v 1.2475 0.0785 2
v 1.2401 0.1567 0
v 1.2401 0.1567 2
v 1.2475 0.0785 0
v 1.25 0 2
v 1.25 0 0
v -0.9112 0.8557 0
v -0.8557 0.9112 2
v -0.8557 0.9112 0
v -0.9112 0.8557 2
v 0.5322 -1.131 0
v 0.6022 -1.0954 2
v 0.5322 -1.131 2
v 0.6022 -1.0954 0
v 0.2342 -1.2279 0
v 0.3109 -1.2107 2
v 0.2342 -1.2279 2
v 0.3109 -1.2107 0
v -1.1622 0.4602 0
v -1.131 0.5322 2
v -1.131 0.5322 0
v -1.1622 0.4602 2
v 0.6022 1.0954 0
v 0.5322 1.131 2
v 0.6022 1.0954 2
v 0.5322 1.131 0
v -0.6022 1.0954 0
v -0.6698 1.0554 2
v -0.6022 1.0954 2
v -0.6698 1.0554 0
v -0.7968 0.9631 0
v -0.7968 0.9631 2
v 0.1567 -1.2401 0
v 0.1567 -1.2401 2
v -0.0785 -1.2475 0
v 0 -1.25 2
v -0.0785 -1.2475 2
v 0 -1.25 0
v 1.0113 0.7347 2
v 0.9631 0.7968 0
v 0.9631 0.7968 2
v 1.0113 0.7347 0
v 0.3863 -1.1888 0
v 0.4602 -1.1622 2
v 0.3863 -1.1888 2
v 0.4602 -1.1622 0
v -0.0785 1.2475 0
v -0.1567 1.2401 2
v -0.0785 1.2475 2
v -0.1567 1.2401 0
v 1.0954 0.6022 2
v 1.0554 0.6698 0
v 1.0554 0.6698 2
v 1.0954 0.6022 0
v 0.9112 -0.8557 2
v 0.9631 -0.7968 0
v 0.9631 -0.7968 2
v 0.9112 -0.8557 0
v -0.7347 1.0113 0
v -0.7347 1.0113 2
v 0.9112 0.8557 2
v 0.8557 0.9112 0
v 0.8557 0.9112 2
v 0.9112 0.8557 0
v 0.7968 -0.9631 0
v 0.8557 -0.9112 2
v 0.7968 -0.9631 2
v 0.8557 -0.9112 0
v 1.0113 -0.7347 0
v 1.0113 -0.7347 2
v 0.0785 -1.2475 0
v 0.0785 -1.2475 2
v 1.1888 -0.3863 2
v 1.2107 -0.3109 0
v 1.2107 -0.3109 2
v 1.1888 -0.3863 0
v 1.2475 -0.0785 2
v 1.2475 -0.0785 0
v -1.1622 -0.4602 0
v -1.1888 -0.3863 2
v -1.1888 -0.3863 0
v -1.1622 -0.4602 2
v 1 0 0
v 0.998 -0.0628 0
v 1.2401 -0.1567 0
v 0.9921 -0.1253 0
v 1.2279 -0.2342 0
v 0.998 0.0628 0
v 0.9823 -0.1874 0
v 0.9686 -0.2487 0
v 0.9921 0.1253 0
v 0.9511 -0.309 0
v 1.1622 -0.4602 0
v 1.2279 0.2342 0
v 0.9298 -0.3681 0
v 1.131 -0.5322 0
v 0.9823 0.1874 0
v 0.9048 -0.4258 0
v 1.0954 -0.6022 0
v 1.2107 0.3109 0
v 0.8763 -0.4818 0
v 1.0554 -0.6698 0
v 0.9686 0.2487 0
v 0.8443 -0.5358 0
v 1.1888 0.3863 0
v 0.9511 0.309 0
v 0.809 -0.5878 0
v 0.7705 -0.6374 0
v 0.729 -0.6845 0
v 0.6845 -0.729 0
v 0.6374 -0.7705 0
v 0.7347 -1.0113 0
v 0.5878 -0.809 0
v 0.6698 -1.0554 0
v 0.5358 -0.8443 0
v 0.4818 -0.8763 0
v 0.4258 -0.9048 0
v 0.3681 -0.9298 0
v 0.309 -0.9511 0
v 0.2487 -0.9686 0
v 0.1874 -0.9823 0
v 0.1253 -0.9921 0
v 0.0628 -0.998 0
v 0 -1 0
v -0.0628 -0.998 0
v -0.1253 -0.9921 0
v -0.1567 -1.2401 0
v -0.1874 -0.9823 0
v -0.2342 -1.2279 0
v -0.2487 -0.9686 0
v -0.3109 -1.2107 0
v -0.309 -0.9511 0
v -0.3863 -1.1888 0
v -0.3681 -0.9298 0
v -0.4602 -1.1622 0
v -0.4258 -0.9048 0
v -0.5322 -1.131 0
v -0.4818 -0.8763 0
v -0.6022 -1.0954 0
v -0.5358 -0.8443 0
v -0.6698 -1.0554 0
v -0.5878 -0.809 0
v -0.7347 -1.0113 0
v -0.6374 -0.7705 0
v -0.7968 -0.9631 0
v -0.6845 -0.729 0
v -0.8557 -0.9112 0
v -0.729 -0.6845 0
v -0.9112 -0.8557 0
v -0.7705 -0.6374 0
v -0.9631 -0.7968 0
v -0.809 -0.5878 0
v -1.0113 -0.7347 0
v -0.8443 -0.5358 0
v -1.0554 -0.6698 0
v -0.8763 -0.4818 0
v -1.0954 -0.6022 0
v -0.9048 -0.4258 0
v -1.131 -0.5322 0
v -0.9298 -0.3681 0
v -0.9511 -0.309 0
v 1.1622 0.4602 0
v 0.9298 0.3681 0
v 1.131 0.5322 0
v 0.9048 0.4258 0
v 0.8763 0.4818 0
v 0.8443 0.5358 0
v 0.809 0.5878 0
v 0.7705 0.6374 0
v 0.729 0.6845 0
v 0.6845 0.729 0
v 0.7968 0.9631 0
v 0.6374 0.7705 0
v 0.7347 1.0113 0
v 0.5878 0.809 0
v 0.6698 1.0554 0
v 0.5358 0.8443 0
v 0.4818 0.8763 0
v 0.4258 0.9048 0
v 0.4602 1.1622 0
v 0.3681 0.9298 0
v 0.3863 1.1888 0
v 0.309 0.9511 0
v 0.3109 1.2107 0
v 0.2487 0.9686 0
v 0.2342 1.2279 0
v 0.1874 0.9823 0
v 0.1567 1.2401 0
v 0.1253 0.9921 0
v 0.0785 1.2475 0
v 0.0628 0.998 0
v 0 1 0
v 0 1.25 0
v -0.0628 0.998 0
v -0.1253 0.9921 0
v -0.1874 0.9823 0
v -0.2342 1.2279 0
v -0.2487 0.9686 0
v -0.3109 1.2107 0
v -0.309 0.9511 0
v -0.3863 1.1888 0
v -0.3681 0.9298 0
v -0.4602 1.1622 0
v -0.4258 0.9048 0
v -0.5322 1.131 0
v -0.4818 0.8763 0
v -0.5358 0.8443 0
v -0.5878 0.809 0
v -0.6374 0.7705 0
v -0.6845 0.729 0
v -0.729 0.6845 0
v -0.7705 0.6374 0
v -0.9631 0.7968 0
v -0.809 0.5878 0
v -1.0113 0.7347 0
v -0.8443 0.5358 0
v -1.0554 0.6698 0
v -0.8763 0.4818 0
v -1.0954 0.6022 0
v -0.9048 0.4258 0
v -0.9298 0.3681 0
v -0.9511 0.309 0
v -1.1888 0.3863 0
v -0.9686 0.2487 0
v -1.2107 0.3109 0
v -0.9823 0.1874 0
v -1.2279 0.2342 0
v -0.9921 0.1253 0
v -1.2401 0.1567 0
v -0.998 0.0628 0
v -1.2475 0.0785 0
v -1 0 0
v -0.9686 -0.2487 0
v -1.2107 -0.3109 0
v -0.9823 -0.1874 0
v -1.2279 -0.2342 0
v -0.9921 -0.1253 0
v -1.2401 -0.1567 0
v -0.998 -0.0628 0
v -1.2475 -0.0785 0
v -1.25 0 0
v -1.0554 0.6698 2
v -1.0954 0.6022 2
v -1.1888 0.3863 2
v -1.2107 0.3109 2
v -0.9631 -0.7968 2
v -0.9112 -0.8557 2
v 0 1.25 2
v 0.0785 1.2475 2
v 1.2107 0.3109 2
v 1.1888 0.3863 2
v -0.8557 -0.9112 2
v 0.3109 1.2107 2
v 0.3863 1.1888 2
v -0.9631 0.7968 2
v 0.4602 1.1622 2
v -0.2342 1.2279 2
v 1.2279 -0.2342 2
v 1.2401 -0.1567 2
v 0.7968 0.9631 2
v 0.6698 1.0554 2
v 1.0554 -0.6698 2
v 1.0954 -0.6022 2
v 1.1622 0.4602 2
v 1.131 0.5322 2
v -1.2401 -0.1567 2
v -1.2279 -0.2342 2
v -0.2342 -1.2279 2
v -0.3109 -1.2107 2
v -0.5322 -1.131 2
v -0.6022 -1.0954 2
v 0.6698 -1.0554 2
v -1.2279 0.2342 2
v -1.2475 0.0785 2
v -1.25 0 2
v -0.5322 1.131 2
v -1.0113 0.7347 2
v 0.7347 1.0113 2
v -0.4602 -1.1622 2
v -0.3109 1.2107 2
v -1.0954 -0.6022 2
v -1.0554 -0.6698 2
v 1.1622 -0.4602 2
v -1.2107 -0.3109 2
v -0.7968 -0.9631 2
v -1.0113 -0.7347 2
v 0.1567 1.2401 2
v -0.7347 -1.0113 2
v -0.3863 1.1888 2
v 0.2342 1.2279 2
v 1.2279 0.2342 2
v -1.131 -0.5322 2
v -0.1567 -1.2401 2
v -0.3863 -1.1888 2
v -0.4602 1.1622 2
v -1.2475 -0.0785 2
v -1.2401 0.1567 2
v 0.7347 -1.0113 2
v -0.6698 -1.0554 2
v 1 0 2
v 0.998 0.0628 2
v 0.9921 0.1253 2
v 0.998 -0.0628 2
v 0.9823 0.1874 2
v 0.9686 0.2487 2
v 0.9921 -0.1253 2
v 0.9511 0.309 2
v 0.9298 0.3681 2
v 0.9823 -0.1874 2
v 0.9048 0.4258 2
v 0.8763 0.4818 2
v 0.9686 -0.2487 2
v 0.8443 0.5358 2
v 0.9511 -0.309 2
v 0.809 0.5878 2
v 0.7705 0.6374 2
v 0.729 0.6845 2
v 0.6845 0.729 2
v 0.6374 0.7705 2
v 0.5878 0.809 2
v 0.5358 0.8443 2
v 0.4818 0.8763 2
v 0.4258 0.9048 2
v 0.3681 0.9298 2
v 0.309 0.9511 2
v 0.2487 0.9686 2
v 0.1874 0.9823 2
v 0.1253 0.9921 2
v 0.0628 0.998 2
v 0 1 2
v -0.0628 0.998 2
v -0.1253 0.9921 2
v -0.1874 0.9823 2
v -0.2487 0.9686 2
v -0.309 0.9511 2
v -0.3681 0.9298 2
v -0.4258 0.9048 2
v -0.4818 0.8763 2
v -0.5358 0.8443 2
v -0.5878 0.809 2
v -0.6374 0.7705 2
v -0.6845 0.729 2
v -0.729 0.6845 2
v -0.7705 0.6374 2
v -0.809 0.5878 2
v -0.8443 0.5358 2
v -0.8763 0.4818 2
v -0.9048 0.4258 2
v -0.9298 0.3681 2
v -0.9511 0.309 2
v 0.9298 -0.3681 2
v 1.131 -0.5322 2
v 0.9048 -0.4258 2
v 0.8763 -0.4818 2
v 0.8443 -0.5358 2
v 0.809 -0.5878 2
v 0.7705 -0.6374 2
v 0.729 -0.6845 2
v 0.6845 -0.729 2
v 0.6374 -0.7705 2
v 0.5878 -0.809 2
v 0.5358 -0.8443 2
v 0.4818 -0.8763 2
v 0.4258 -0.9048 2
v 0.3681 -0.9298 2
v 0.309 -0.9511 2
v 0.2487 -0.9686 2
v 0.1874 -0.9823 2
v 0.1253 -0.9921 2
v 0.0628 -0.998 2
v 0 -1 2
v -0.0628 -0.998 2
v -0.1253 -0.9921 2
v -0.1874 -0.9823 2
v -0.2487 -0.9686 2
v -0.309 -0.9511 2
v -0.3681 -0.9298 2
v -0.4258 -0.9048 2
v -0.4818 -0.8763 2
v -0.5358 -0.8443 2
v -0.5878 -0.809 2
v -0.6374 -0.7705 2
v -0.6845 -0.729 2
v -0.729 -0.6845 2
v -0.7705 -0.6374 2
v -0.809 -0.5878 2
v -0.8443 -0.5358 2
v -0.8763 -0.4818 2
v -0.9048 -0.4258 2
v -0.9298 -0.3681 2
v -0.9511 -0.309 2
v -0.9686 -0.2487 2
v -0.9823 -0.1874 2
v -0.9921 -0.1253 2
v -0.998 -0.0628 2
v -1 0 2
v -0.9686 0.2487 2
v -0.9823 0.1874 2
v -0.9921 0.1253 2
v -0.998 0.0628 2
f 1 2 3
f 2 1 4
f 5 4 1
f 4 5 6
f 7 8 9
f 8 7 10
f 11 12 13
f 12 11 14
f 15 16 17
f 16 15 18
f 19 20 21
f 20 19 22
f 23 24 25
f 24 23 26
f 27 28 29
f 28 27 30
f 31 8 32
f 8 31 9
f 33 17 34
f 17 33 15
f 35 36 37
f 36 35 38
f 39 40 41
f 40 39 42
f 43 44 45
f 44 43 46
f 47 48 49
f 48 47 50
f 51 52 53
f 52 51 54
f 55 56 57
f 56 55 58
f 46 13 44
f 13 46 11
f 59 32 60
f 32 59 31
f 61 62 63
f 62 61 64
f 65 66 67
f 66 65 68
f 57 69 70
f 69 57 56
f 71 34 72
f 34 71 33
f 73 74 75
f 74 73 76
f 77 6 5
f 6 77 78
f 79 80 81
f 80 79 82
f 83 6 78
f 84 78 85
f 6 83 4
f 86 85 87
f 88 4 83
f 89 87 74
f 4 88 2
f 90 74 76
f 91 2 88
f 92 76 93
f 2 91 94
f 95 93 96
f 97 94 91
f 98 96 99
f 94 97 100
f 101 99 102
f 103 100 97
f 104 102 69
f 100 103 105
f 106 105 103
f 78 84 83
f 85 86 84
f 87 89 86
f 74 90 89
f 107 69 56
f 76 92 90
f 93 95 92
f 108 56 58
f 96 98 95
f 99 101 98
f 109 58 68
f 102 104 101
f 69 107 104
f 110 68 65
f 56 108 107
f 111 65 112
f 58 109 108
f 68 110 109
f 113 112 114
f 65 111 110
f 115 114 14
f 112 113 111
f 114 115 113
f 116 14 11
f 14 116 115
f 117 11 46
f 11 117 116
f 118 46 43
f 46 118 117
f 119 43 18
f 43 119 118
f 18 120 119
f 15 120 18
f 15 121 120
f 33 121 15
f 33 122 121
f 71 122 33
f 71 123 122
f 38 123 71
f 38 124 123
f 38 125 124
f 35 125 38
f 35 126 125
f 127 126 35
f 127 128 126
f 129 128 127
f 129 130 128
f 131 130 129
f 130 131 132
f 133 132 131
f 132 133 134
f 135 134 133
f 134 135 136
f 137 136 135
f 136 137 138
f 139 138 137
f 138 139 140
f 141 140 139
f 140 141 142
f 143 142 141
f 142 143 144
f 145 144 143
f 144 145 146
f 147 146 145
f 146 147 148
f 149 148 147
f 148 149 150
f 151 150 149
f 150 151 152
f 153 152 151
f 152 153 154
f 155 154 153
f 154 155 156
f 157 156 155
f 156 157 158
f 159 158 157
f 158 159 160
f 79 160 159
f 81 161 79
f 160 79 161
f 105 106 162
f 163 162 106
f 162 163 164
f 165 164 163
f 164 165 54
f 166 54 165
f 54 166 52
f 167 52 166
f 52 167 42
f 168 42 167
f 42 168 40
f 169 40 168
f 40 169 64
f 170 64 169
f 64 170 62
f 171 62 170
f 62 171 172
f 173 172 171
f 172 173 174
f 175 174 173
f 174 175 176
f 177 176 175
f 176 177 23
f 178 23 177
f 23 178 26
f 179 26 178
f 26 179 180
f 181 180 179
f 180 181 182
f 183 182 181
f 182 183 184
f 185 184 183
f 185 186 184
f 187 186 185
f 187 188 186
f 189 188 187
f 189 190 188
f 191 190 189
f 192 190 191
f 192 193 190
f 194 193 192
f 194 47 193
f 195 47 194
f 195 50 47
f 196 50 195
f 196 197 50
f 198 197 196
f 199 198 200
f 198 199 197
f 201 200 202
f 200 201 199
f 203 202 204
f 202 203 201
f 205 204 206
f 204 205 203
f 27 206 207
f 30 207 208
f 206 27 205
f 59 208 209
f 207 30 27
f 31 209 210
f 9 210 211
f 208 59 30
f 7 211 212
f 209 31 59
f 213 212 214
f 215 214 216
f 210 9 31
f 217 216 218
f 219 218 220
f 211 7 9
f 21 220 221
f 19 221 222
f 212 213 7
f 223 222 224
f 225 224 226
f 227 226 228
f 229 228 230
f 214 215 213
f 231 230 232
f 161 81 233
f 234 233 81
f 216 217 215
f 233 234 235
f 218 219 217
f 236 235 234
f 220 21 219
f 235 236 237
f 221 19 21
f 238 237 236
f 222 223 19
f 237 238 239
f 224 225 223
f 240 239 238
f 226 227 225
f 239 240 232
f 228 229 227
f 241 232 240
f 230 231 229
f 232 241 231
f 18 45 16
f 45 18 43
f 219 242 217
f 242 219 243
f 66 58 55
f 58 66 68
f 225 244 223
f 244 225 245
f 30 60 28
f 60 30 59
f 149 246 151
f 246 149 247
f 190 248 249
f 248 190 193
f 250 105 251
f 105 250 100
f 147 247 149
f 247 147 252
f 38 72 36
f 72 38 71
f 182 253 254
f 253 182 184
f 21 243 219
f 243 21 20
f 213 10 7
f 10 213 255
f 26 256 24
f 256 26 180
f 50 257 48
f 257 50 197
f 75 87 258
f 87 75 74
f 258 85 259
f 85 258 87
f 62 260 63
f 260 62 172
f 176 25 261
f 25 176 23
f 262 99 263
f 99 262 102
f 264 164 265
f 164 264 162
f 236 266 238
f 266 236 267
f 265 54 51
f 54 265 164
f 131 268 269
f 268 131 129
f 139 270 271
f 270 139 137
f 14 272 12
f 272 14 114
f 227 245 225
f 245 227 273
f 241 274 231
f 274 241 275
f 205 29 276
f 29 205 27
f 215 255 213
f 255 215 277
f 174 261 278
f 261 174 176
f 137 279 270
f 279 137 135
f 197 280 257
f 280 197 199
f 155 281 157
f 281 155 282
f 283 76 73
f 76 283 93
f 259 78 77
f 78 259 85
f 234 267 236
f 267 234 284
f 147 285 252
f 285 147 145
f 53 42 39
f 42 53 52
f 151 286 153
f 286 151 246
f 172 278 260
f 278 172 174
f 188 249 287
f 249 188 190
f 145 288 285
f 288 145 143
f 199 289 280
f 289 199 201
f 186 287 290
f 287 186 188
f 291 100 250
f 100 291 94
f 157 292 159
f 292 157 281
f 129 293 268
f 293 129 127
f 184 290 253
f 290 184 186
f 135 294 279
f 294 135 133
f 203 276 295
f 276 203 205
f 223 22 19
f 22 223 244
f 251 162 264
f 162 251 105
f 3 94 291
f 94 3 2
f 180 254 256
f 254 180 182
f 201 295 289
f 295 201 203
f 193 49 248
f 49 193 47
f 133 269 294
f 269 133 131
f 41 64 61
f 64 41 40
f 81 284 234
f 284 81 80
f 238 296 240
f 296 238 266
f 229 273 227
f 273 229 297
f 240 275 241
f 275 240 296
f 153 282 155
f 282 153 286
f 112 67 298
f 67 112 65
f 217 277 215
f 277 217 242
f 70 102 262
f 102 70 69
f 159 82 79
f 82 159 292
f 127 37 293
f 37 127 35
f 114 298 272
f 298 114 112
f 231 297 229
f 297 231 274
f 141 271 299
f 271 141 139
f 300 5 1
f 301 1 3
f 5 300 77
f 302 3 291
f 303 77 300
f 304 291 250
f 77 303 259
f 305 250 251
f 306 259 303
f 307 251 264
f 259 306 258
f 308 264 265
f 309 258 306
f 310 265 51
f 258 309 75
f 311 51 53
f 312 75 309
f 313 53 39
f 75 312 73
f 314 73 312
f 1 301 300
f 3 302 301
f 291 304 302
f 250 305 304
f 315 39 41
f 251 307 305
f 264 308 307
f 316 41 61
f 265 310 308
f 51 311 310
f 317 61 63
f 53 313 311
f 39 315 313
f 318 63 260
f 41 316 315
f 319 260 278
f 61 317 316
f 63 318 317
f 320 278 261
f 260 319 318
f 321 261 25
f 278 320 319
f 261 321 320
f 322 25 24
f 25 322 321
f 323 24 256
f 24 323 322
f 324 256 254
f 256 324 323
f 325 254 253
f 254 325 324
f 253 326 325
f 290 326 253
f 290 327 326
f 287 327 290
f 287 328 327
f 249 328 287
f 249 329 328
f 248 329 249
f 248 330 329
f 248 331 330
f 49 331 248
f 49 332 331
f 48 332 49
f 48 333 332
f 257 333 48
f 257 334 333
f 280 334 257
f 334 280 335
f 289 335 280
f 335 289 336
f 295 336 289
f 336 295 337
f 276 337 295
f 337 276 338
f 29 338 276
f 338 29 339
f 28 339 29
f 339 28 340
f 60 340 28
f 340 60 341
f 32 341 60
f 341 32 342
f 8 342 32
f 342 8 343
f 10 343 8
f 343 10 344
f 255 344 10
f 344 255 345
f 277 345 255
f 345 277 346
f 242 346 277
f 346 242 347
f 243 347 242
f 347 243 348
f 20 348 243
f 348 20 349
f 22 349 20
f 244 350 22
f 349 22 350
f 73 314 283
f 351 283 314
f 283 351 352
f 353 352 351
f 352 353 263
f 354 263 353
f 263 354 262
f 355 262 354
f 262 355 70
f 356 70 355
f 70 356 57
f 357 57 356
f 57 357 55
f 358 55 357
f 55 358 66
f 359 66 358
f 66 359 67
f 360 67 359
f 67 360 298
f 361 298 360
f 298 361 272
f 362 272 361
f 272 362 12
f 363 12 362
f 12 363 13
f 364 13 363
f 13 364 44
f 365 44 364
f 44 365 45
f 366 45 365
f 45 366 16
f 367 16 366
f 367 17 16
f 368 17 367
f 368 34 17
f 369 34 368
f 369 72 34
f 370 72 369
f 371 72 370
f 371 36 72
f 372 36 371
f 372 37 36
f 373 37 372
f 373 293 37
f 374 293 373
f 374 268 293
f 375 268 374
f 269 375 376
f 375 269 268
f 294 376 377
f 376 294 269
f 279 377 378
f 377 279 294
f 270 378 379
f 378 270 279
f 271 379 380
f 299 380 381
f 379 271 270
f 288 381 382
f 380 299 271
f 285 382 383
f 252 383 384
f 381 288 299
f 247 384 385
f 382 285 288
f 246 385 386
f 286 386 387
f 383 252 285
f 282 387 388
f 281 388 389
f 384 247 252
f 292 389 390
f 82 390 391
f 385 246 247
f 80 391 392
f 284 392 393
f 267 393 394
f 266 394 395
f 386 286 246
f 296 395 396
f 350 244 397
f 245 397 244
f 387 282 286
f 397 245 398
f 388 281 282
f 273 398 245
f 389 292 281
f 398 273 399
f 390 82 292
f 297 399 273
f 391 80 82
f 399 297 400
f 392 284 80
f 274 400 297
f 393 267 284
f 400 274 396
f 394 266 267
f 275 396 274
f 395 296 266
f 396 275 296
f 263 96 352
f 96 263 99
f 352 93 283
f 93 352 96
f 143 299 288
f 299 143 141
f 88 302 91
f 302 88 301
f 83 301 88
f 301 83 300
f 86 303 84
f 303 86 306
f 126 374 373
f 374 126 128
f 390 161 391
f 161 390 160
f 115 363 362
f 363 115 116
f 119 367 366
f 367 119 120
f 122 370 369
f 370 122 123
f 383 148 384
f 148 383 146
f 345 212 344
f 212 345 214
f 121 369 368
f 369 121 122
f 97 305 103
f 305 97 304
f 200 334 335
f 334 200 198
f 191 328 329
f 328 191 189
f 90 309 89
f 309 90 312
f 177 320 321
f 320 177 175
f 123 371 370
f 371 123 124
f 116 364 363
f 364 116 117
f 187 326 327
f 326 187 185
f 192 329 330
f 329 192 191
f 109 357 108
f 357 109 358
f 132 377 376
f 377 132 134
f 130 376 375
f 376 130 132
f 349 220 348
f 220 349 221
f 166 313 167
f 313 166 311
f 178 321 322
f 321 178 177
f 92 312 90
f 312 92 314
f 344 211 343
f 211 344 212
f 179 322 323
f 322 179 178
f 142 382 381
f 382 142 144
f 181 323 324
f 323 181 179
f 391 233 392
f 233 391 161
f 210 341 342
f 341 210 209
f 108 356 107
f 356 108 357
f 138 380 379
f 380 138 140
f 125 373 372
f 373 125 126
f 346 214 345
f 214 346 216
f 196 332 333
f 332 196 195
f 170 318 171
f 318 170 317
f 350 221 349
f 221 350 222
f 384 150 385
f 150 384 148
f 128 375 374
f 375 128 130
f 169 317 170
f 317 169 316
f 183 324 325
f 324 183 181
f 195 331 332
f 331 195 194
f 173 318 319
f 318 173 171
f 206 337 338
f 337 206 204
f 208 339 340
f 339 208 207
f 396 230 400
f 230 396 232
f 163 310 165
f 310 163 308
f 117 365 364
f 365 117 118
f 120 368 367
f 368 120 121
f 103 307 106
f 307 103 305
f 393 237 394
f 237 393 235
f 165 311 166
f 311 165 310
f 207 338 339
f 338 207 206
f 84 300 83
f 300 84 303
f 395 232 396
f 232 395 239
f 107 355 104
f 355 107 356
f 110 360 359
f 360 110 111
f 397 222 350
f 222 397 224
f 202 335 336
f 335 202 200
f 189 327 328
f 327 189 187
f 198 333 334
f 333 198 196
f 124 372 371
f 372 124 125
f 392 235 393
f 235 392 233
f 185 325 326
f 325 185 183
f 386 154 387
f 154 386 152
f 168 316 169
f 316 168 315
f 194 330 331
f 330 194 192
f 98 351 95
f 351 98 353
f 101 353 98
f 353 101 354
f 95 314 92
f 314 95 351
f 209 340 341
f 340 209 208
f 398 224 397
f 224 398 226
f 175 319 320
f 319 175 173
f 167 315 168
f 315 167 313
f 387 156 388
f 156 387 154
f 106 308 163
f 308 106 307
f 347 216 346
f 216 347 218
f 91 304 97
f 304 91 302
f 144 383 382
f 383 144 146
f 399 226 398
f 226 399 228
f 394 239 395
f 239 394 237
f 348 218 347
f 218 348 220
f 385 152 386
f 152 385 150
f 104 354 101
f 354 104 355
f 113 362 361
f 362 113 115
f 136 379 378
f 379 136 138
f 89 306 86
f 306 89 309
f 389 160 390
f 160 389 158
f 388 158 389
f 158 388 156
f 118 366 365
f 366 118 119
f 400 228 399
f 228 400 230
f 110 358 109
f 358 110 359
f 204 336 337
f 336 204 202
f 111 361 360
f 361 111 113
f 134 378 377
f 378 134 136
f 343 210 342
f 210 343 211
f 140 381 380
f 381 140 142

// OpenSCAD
//################################################################
// paper tube.scad - creates simple hollow cylinder
// (c) 2021 - Roie R. Black
// docs: https://rblack.github.io/math-magik/magik/paper_tube.html

$fn = 100;

module paper_tube(r=1, h=2, t=0.25, debug=false) {
  th = 3 * h;
  difference() {
    cylinder(r=r+t,h=h);
      translate([0,0,-h])
         if (debug) {
            #cylinder(r=r, h=th);
         } else {
           cylinder(r=r, h=th);
         }
    }
}

paper_tube(debug=true);
